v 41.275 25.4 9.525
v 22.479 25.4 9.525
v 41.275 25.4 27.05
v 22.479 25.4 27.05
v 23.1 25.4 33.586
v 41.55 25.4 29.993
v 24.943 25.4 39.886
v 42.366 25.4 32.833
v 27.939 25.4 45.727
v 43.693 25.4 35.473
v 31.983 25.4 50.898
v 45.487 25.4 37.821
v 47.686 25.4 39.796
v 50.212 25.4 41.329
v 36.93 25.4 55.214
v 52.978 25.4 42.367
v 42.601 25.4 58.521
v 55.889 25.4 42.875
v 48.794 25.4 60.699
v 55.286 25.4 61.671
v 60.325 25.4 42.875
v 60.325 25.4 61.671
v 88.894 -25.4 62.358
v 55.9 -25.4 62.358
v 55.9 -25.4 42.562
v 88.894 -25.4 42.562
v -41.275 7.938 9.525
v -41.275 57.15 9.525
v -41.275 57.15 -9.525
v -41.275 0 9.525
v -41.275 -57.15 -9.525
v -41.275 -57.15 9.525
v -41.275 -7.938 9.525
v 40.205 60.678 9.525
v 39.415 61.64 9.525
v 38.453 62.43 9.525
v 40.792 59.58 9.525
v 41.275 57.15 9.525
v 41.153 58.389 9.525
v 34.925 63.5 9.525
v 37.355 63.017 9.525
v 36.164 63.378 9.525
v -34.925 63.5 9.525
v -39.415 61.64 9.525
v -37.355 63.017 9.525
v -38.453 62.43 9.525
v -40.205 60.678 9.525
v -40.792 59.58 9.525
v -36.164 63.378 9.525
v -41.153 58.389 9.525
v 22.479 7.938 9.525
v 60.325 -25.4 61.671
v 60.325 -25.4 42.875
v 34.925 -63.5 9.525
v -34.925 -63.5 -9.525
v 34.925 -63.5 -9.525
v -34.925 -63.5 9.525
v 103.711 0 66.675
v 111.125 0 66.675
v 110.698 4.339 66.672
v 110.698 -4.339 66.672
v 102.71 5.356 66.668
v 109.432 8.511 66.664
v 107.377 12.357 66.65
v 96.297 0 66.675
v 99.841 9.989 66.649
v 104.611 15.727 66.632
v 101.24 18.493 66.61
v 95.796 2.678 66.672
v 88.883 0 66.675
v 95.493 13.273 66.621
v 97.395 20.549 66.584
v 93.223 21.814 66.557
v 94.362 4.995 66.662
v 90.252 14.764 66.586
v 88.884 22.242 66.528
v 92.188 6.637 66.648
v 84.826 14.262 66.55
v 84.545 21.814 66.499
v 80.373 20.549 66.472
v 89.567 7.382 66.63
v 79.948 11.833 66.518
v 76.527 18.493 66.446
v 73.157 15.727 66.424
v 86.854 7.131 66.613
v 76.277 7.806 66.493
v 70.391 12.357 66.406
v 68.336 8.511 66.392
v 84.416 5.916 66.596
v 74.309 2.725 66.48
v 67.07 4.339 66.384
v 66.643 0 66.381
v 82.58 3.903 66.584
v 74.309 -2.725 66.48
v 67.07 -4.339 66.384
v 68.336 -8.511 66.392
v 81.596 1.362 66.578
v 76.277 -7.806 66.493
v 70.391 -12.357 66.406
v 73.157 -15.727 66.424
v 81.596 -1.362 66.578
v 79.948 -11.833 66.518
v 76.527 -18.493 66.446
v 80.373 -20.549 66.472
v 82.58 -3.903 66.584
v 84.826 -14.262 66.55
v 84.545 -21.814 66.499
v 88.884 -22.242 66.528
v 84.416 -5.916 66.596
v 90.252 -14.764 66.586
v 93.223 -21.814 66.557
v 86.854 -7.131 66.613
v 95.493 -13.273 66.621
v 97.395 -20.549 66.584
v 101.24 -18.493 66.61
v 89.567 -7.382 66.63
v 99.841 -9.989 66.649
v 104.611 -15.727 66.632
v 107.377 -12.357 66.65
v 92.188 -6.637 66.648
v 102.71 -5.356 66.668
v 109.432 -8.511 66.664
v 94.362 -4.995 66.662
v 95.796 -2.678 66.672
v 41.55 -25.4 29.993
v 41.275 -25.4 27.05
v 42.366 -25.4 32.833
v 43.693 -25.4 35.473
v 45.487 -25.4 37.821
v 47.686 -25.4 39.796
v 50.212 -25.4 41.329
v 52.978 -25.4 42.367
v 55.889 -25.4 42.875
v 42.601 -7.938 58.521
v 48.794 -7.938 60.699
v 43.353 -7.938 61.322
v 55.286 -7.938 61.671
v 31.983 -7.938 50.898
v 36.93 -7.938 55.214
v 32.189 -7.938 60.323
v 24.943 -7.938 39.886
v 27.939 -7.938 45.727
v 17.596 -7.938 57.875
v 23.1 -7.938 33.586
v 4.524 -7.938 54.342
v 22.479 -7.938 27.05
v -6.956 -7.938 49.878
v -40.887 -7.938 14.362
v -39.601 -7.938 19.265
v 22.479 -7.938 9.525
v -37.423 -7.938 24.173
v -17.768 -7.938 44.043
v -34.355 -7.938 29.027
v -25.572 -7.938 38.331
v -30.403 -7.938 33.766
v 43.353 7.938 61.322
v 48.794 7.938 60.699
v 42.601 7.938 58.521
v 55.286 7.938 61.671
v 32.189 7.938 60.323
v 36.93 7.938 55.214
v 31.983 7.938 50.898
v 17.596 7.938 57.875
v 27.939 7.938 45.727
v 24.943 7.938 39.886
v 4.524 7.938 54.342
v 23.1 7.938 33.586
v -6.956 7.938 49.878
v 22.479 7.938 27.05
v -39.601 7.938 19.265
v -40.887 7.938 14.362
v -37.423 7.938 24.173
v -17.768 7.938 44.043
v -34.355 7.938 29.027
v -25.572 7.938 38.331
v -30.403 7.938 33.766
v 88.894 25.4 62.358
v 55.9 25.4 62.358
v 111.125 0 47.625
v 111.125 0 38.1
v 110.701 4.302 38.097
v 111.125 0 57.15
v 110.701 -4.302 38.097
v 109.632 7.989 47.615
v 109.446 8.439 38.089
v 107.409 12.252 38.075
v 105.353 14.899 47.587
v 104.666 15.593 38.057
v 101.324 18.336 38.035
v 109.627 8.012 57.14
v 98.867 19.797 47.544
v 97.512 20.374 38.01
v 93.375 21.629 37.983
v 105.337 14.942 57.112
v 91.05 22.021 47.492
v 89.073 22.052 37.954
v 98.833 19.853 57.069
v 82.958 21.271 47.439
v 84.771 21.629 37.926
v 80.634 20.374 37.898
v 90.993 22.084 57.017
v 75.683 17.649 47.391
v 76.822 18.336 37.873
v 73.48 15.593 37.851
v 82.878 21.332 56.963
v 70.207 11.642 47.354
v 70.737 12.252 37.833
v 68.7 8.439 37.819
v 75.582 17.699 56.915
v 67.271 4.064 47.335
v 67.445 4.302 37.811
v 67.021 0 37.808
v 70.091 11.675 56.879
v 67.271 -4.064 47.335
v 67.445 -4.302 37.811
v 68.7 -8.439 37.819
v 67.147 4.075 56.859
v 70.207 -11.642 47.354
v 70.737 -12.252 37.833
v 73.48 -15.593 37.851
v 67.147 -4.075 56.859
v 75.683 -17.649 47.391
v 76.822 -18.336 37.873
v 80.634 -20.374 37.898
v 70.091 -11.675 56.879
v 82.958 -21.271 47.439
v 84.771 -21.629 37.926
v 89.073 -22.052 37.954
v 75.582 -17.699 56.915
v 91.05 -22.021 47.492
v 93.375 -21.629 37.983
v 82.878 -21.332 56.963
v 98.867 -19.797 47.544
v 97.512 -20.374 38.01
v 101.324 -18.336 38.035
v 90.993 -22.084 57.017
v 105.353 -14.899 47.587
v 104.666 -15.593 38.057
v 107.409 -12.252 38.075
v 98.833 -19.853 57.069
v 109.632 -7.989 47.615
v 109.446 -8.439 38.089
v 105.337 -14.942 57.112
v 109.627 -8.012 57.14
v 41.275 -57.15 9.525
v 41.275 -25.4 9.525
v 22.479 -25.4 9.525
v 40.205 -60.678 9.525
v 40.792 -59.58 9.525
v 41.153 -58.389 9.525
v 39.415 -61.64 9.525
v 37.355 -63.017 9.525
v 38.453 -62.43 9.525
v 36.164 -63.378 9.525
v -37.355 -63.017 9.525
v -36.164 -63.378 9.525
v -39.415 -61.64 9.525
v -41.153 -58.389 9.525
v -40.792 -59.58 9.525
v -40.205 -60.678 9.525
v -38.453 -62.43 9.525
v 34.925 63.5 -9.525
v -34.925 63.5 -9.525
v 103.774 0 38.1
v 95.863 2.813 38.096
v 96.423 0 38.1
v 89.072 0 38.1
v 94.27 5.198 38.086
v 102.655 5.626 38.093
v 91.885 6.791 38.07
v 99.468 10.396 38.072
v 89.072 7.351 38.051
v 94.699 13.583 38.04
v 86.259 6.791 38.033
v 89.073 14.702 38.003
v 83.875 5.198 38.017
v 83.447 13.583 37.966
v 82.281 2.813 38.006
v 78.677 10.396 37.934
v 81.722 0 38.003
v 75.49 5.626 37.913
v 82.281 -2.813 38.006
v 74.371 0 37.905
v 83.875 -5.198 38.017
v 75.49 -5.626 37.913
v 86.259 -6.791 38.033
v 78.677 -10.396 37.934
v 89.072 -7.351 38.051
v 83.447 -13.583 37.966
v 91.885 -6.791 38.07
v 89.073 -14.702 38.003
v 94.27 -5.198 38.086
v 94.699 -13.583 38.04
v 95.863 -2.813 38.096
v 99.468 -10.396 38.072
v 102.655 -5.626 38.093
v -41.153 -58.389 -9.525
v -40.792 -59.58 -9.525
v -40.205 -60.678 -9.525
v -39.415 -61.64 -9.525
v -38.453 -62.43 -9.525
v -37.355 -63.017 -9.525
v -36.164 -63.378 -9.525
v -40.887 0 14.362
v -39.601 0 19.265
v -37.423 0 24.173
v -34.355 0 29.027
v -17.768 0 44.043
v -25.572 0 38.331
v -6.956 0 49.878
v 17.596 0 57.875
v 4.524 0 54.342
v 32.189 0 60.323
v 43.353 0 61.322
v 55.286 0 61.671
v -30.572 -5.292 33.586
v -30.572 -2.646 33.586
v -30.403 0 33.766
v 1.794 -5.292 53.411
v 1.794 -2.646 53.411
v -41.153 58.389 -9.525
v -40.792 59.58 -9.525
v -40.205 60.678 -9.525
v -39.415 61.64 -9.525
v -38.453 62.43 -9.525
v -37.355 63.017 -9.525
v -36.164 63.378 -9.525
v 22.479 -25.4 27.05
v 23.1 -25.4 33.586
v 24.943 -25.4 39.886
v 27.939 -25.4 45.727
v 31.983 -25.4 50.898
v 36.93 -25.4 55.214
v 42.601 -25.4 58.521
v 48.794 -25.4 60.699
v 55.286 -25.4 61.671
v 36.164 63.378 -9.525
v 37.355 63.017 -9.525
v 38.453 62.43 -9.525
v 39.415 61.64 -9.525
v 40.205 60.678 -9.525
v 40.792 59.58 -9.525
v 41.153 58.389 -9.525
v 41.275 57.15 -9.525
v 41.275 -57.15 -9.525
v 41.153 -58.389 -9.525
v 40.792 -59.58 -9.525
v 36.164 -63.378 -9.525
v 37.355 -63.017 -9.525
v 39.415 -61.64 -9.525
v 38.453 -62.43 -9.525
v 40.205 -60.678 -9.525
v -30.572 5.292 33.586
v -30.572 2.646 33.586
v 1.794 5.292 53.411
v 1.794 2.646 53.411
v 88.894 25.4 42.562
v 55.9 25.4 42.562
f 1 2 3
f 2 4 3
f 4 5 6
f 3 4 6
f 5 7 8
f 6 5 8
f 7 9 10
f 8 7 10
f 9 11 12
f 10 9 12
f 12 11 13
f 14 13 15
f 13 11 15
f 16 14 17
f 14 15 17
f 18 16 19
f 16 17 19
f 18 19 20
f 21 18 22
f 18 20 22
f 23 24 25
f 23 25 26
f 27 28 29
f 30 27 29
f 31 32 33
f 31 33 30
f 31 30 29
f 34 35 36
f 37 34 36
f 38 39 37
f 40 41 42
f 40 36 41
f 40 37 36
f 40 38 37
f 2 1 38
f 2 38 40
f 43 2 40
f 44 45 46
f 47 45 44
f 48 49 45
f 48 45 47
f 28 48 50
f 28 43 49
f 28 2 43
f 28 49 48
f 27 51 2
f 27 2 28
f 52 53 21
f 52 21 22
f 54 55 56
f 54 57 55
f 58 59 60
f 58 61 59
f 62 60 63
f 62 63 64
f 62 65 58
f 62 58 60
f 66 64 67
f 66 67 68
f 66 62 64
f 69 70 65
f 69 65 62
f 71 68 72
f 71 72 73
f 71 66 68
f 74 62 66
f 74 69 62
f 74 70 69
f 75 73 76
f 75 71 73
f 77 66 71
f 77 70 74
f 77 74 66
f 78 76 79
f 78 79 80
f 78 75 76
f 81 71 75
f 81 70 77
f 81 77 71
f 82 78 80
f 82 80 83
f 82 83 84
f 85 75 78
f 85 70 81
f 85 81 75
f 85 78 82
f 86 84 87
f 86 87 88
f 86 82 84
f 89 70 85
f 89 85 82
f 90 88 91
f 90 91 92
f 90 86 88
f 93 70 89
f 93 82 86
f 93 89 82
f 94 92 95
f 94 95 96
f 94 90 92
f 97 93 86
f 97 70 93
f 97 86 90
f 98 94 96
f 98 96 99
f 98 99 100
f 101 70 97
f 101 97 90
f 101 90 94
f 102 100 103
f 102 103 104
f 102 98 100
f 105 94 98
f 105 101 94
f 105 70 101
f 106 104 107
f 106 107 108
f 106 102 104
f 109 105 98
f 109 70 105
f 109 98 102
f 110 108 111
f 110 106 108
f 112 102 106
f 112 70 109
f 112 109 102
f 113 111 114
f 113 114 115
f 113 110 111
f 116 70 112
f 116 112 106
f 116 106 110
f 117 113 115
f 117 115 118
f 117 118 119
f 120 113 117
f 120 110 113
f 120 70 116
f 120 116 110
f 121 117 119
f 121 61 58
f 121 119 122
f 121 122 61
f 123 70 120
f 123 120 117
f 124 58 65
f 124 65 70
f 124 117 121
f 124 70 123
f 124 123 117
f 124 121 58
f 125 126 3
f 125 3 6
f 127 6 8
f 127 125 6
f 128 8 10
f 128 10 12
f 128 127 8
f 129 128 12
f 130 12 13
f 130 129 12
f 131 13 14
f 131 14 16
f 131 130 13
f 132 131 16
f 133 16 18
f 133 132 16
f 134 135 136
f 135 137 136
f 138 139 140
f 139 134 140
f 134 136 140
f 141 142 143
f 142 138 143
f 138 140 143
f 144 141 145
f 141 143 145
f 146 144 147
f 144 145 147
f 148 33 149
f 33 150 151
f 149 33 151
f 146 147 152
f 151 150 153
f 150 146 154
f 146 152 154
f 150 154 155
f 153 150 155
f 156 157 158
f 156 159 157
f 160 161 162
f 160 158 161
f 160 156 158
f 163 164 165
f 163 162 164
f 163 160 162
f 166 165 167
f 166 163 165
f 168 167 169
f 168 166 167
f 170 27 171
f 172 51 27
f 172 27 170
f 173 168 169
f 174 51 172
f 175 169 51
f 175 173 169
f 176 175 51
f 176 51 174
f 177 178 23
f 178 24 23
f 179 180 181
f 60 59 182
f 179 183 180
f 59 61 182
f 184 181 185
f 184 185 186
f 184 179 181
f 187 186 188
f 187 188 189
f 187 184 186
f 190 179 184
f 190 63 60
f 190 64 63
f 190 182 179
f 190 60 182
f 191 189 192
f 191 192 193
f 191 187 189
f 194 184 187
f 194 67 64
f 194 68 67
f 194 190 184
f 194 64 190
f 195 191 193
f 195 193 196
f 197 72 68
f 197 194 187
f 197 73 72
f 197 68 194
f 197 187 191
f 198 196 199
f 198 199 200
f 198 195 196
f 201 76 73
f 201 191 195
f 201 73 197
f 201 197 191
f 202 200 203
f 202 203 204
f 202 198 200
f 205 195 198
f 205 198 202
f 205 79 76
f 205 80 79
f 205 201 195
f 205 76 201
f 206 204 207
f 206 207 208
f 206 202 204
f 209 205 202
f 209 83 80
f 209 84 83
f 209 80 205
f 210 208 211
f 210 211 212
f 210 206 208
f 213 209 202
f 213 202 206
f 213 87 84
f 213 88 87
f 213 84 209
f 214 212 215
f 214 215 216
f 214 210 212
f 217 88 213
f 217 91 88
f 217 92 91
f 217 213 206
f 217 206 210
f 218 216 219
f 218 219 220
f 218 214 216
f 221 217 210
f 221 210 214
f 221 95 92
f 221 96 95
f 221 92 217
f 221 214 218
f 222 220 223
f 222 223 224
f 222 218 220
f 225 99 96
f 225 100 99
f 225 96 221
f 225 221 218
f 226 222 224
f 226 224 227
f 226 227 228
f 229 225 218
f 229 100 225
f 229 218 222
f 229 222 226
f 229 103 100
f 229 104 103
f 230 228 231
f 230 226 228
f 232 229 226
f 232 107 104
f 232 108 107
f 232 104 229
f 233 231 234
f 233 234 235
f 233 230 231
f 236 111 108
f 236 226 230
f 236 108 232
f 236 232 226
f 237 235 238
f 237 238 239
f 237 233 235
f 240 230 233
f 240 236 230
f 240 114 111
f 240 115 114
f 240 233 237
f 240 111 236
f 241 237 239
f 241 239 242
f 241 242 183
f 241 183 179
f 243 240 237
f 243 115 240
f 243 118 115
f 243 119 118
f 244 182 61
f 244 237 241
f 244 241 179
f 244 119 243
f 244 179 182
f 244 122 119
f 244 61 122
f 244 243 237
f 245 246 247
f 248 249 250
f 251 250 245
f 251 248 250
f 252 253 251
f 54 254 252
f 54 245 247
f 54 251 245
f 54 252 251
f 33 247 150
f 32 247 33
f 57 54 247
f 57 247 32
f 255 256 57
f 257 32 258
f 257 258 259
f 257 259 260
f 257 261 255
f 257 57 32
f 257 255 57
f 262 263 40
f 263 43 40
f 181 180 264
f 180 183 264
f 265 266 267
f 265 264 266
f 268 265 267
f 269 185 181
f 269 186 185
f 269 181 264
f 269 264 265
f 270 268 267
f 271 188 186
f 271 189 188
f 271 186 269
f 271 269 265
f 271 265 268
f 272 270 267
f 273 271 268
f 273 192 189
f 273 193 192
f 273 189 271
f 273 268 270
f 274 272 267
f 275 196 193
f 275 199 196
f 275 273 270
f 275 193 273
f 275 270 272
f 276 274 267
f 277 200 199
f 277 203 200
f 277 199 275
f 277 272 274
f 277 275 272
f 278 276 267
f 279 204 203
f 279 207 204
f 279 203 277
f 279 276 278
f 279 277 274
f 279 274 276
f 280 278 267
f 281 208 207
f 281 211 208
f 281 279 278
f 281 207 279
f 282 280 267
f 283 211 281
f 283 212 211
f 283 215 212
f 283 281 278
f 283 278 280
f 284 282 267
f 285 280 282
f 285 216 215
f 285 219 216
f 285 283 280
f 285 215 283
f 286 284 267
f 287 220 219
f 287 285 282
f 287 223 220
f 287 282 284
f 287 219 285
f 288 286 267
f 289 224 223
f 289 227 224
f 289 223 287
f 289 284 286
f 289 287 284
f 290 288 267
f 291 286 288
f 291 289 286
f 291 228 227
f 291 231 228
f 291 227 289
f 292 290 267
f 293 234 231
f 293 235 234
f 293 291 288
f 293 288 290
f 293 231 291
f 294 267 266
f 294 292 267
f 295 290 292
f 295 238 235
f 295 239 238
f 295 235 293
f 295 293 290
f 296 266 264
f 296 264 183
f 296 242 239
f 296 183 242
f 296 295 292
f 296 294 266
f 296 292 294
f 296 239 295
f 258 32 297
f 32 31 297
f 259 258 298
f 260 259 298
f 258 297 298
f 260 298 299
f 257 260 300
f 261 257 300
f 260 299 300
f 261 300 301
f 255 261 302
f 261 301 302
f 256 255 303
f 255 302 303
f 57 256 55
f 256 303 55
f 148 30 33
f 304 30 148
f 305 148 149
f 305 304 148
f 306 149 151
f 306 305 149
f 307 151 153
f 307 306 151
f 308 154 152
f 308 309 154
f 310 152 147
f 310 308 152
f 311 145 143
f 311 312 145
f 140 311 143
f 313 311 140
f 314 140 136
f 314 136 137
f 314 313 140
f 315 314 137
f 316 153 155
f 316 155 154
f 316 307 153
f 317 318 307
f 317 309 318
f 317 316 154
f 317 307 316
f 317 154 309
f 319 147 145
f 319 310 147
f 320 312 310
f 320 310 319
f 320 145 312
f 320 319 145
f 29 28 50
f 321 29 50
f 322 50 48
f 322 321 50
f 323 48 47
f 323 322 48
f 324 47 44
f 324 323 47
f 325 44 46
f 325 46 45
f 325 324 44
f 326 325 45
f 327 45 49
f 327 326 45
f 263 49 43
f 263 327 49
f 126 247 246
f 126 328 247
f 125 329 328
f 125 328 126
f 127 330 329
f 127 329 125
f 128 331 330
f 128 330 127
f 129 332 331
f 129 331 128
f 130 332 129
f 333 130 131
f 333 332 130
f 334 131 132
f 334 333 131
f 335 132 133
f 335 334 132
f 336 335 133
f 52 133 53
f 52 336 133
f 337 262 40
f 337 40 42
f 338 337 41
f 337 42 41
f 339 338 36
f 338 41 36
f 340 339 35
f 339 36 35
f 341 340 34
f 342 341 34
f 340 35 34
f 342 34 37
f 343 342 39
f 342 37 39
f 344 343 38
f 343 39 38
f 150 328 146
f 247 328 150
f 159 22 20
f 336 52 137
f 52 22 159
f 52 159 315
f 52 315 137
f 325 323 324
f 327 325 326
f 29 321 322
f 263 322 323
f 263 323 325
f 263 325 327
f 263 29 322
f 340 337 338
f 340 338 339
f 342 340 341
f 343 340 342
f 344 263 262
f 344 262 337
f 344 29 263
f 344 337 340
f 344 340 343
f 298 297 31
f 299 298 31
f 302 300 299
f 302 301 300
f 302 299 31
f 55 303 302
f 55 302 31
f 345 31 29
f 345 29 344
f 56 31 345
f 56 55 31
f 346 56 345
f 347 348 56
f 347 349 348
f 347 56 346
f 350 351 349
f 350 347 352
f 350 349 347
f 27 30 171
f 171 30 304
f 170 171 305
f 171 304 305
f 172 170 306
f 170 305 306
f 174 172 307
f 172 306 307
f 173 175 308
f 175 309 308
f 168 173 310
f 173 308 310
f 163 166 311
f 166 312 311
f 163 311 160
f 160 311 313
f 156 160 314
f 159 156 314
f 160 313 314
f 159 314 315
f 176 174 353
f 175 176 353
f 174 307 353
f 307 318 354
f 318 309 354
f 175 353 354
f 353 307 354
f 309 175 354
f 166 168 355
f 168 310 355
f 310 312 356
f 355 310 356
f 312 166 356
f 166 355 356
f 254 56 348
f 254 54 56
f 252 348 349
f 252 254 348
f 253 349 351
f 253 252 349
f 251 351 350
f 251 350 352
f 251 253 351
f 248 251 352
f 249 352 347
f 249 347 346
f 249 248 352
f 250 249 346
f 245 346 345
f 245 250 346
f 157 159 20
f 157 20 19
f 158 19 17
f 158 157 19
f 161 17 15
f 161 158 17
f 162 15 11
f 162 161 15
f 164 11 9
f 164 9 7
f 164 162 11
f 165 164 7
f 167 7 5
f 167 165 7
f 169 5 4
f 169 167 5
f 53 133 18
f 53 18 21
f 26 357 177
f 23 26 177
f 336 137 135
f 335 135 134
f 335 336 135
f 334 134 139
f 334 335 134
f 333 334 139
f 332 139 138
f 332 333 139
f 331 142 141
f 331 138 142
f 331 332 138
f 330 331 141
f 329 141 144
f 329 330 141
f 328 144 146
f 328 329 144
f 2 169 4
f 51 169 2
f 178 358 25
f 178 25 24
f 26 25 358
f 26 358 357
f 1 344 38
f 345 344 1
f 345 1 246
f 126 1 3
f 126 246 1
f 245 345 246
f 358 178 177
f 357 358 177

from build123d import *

# Parameters (mm, degrees)
F1_DEPTH = 63.5
F2_DEPTH = 25.4
F3_DEPTH = 7.9375
F4_R     = 6.35
F6_W     = 32.9938158393
F6_H     = 19.7962932289
F7_DEPTH = 25.4


with BuildPart() as f1:
    # F0 (on Front) → F1 (new body, symmetric)
    with BuildSketch(Plane.XZ):
        Polygon((-41.275, 9.525), (-41.275, -9.525), (41.275, -9.525), (41.275, 9.525), (22.4789988603, 9.525), align=None)
    extrude(amount=F1_DEPTH, both=True)

    # F0 (on Front) → F2 (join, symmetric)
    with BuildSketch(Plane.XZ):
        with BuildLine():
            Line((22.4789988603, 9.525), (41.275, 9.525))
            Line((41.275, 9.525), (41.275, 27.0503496115))
            ThreePointArc((41.275, 27.0503496115), (45.4874194262, 37.8206717682), (55.8891529902, 42.8752))
            Line((55.8891529902, 42.8752), (60.325, 42.8752))
            Line((60.325, 42.8752), (60.325, 61.6712011397))
            Line((60.325, 61.6712011397), (55.2858756767, 61.6712011397))
            ThreePointArc((55.2858756767, 61.6712011397), (31.9834609395, 50.8982768117), (22.4789988603, 27.0503496115))
            Line((22.4789988603, 27.0503496115), (22.4789988603, 9.525))
        make_face()
    extrude(amount=F2_DEPTH, both=True)

    # F0 (on Front) → F3 (join, symmetric)
    with BuildSketch(Plane.XZ):
        with BuildLine():
            add(Edge.make_bspline(
                [(-41.275, 9.525), (-41.5834896266, 33.2611203194), (-8.5896747187, 61.635799706), (55.2858756767, 61.6712011397)],
                knots=[0, 0, 0, 0, 109.7416466286, 109.7416466286, 109.7416466286, 109.7416466286], degree=3))
            Line((-41.275, 9.525), (22.4789988603, 9.525))
            Line((22.4789988603, 9.525), (22.4789988603, 27.0503496115))
            ThreePointArc((22.4789988603, 27.0503496115), (31.9834609395, 50.8982768117), (55.2858756767, 61.6712011397))
        make_face()
    extrude(amount=F3_DEPTH, both=True)

    # F4
    f4_edges = [f1.edges().sort_by_distance(p)[0] for p in [
        (41.275, -63.5, 0),
        (-41.275, -63.5, 0),
        (41.275, 63.5, 0),
        (-41.275, 63.5, 0),
    ]]
    fillet(f4_edges, radius=F4_R)


with BuildPart() as f5:
    # F0 (on Front) → F5 (revolve)
    with BuildSketch(Plane.XZ):
        Polygon((111.125, 66.675), (88.8829651042, 66.675), (89.0720188618, 38.1), (111.125, 38.1), align=None)
    revolve(axis=Axis((88.977491983, 0, 52.3875), (-0.0066159097, 0, 0.9999781146)))


with BuildPart() as f7:
    # F6 (on Front) → F7 (new body, symmetric)
    with BuildSketch(Plane.XZ):
        with Locations((72.3972059786, 52.4601656944)):
            Rectangle(F6_W, F6_H)
    extrude(amount=F7_DEPTH, both=True)


solid = Compound([f1.part, f5.part, f7.part])
